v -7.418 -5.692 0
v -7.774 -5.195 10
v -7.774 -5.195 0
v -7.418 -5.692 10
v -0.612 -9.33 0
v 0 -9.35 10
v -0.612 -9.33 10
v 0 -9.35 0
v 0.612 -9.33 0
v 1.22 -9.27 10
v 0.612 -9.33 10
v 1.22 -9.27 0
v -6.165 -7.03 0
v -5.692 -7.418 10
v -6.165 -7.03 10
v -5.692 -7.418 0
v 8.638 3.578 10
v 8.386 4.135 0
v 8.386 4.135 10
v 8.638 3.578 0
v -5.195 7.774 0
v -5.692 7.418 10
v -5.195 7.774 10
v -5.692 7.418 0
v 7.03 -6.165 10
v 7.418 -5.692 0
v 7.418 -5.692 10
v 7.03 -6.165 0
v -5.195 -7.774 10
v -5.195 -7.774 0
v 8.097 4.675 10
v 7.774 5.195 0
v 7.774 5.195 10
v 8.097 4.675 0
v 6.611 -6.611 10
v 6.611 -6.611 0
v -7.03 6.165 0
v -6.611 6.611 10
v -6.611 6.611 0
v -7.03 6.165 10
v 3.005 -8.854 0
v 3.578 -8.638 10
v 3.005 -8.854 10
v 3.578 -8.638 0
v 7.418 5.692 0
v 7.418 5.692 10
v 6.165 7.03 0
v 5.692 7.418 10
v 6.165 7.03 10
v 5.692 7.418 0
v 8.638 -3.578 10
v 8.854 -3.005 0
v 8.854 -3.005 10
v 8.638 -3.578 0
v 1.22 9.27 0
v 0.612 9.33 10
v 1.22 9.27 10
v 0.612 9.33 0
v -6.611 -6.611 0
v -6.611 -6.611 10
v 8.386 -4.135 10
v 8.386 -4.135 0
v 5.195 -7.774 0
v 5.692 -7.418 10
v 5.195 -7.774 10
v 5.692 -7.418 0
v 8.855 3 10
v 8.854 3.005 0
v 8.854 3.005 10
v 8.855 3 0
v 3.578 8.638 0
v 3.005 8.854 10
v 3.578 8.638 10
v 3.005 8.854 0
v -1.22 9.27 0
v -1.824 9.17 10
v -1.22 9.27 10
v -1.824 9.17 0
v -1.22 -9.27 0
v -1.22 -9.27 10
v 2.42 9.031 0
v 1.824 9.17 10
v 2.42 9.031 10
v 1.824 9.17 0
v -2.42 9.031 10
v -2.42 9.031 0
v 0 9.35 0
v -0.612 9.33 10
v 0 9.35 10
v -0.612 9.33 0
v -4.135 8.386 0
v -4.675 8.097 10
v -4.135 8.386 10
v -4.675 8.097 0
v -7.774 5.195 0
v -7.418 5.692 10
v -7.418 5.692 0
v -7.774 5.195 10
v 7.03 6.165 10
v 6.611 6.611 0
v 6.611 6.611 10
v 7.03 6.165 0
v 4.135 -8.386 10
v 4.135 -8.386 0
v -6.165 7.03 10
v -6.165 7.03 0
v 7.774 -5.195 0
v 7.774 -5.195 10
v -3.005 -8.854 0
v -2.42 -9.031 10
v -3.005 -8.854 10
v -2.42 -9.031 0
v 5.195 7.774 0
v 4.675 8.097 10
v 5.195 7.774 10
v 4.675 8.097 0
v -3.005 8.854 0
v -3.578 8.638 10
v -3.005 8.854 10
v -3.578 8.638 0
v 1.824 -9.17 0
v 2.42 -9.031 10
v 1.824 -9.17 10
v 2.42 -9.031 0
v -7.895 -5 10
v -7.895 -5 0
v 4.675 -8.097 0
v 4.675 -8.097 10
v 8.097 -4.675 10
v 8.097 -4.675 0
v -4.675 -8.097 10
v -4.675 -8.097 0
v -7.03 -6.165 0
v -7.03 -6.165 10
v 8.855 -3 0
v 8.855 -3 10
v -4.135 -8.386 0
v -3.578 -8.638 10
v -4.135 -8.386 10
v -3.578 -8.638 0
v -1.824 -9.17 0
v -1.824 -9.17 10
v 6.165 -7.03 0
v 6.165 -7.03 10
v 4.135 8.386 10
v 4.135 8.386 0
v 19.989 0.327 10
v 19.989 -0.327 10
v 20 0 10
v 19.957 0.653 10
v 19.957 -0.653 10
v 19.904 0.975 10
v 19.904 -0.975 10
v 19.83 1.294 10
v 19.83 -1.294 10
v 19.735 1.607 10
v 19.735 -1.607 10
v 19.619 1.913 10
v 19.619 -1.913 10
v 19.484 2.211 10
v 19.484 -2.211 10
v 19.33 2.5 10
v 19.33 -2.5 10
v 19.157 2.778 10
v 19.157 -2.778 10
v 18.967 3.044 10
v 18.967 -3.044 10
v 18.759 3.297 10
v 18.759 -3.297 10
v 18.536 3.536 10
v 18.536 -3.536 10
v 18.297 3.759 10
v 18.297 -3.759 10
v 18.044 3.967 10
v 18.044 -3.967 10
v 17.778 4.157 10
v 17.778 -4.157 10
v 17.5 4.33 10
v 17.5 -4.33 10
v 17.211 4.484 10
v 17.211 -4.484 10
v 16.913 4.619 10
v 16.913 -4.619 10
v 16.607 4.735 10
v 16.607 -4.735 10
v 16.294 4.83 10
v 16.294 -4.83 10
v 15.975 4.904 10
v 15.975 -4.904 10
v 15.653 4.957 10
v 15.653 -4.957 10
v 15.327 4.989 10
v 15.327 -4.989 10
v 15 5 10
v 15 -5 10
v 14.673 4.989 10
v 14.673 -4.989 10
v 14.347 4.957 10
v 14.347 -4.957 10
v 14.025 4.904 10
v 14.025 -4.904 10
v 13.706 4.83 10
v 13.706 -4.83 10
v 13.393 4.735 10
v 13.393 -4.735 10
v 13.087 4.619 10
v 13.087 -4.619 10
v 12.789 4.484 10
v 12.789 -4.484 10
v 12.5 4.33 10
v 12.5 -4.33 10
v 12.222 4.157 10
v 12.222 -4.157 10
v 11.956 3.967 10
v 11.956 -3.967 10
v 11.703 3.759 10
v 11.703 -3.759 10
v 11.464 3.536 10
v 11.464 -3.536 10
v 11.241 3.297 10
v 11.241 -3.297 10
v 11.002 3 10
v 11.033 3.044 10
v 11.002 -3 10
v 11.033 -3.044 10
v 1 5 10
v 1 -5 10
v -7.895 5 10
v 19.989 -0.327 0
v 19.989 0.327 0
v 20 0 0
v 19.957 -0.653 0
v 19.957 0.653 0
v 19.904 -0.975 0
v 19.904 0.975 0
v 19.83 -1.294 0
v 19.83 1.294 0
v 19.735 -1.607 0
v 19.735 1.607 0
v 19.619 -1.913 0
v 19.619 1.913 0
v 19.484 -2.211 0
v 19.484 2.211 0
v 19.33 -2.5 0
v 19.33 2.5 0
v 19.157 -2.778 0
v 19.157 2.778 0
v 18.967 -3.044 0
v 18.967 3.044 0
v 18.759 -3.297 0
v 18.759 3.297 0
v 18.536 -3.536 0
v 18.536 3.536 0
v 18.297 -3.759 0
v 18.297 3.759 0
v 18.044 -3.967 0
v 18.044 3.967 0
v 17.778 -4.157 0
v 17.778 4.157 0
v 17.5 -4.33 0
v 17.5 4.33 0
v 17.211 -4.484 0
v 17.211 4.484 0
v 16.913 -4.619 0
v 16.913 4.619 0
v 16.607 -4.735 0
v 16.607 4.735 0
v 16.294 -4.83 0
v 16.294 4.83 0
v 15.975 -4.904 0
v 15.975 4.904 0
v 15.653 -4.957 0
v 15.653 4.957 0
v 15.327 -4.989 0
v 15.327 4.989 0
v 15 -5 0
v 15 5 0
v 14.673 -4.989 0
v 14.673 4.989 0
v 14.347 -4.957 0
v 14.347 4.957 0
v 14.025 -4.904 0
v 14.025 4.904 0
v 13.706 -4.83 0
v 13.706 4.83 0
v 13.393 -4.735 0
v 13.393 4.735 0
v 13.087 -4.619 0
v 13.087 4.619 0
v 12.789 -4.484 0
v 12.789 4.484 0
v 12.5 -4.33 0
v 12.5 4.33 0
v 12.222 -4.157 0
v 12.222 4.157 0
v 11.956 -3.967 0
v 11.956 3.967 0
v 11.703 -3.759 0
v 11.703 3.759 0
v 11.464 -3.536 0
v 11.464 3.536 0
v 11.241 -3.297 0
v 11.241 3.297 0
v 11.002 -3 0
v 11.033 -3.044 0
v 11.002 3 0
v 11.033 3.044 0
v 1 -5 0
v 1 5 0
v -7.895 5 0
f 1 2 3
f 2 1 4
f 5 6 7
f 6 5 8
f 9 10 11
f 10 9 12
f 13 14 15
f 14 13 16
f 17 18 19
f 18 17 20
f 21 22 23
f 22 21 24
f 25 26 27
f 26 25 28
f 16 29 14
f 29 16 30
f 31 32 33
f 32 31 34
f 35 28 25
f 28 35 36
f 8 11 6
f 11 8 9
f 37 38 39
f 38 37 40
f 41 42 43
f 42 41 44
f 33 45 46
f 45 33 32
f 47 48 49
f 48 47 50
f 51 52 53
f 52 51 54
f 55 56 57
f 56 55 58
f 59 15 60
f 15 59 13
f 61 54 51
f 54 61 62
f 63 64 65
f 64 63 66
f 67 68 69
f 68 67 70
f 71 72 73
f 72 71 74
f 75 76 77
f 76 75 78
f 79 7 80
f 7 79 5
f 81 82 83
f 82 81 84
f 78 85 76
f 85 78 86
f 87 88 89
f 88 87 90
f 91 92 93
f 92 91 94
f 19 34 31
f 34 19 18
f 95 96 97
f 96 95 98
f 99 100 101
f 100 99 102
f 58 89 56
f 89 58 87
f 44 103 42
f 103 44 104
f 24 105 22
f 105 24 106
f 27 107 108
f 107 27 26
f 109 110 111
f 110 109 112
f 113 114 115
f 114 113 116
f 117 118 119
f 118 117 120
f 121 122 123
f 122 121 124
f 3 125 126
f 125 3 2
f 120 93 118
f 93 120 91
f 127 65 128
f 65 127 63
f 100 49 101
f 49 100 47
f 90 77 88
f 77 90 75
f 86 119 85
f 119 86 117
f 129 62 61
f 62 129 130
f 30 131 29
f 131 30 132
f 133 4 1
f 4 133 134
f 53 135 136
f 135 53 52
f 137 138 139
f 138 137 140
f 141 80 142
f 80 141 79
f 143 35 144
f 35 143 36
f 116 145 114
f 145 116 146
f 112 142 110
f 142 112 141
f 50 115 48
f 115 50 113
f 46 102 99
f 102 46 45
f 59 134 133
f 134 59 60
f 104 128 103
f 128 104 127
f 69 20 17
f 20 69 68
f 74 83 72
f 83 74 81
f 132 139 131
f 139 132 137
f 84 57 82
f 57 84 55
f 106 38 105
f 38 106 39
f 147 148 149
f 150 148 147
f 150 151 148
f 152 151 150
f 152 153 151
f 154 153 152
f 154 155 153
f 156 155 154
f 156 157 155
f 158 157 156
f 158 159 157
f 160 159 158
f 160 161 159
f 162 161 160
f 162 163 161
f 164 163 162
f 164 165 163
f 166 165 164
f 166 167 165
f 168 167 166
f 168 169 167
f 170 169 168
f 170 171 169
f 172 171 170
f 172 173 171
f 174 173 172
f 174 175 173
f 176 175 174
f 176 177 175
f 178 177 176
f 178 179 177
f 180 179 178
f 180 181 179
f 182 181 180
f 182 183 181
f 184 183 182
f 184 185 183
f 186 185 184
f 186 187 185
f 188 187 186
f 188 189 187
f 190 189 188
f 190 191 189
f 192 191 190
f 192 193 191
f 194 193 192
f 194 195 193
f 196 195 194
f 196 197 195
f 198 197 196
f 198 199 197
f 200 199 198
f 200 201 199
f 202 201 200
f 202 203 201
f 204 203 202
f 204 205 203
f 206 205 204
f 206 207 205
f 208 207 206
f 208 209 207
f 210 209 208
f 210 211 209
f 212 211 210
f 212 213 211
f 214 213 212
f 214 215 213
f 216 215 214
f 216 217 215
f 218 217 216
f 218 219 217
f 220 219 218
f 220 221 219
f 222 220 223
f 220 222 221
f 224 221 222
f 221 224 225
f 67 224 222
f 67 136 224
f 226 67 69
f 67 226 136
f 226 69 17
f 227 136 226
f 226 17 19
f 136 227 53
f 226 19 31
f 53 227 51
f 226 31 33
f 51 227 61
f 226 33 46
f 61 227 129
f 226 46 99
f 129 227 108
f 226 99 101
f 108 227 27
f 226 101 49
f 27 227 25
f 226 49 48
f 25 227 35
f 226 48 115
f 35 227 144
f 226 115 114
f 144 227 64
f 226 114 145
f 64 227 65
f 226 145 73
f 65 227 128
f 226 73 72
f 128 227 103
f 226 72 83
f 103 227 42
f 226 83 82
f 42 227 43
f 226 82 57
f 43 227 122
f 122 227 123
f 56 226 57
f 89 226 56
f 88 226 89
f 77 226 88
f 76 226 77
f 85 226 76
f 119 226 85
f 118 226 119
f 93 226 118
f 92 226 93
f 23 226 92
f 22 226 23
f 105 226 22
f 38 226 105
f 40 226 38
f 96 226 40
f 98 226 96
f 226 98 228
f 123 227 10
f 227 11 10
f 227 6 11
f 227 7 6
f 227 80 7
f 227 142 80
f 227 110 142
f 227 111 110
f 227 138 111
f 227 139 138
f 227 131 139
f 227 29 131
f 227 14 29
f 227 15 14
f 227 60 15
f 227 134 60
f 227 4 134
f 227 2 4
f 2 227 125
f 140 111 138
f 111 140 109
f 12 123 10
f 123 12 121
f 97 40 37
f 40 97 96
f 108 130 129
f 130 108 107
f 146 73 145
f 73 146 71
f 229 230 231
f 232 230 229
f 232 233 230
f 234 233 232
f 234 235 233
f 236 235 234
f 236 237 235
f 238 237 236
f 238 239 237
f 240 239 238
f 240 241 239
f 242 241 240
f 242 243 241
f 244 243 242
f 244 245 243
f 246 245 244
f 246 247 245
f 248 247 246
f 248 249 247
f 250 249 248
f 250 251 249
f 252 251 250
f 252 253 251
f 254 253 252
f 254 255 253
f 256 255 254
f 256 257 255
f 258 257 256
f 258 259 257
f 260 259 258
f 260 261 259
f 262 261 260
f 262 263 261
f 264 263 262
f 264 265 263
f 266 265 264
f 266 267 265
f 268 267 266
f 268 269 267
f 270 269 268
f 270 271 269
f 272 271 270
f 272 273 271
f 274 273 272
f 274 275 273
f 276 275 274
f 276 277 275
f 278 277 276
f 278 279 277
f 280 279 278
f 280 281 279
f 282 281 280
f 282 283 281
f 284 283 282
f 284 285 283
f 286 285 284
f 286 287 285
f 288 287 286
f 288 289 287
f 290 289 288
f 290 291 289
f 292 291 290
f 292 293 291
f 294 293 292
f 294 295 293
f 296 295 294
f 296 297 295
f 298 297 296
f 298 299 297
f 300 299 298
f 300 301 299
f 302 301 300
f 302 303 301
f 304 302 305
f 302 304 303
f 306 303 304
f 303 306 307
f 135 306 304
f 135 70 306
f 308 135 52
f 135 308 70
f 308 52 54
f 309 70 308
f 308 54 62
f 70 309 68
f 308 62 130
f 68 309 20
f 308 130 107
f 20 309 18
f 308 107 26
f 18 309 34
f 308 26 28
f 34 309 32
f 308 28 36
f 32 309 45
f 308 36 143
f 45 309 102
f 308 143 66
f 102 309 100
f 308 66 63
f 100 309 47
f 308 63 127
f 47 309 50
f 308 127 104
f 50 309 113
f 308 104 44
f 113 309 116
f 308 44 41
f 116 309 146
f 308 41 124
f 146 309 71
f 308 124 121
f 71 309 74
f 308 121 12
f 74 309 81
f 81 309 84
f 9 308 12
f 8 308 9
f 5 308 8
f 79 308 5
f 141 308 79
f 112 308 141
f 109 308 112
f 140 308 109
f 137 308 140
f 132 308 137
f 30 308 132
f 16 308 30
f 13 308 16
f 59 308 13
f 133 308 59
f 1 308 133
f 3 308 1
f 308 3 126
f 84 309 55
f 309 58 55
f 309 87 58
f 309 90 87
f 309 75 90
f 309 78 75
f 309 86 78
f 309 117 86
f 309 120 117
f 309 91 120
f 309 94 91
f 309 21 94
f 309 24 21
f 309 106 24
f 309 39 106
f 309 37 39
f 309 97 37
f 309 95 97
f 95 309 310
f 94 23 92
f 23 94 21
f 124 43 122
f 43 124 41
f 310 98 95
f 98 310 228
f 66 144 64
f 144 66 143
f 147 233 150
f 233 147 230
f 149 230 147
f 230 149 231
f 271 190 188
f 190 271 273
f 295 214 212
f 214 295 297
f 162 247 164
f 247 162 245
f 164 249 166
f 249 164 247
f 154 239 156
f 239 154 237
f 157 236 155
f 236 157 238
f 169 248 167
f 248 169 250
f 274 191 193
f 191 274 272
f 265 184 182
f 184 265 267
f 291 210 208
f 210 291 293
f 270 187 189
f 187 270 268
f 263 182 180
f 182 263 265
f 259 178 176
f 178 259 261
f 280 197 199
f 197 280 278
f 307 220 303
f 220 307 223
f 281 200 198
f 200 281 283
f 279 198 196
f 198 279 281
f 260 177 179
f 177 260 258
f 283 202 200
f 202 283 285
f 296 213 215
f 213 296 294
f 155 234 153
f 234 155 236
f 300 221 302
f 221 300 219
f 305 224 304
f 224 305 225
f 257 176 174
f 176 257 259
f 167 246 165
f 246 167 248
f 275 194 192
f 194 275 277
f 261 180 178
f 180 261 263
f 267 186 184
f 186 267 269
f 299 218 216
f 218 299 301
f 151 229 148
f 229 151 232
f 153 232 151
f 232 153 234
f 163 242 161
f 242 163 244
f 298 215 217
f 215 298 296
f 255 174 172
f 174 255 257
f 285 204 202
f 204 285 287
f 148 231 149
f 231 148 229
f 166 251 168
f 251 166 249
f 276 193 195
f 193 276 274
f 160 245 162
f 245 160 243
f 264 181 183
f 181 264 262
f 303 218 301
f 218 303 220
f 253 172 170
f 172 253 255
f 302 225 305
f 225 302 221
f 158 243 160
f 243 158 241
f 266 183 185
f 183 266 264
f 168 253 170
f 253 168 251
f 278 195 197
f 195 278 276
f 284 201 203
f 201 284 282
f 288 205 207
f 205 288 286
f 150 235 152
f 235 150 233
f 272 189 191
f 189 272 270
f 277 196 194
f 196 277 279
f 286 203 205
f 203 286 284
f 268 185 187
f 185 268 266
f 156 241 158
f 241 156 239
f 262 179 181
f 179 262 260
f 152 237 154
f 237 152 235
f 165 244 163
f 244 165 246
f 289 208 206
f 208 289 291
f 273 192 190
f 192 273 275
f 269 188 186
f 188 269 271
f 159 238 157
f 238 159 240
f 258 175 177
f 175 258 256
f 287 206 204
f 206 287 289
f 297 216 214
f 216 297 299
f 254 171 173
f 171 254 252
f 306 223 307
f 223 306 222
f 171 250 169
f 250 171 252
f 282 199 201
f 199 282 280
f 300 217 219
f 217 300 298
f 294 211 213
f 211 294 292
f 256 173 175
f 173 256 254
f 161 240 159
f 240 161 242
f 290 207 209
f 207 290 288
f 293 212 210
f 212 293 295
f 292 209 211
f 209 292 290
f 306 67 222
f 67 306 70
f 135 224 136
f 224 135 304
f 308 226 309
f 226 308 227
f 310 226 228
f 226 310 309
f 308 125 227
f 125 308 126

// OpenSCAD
// Tubing and stand rod snap-on clip
// Print orientation: flat on bed, z = 0 up to z = 10

// ---------- Parameters ----------
stand_d      = 12.7;   // stand rod diameter
stand_wall   = 3;      // stand ring wall thickness
stand_open   = 10;     // stand ring opening width (y)
stand_r      = stand_d/2 + stand_wall; // stand ring outer radius (18.7)

tubing_d     = 6;      // tubing inner diameter
tubing_wall  = 2;      // tubing ring wall thickness
tubing_x     = 15;     // tubing ring centre x
tubing_r     = tubing_d/2 + tubing_wall; // tubing ring outer radius (10)
tubing_open  = 4.5;    // tubing ring opening width (y)

bridge_w     = 6;      // bridge width (Y)
bridge_x0    = 8;      // bridge start (X)
bridge_x1    = 12;     // bridge end (X)

eps          = 0.5;    // cutter overshoot
$fn          = 96;     // curve resolution

// ---------- Model ----------
difference() {
    union() {
        // Stand ring
        cylinder(r = stand_r, h = 10);
        // Tubing ring
        translate([tubing_x, 0, 0])
            cylinder(r = tubing_r, h = 10);
        // Bridge
        translate([bridge_x0, -bridge_w/2, 0])
            cube([bridge_x1 - bridge_x0, bridge_w, 10]);
    }

    // Stand ring opening: x < 0 and -5 < y < 5
    translate([-stand_r - eps, -stand_open/2, -eps])
        cube([stand_r + eps + 1, stand_open, 10 + 2*eps]);

    // Tubing ring opening: x > 15 and -2.25 < y < 2.25
    translate([tubing_x + tubing_r + eps, -tubing_open/2, -eps])
        cube([tubing_r + eps + 1 - tubing_x, tubing_open, 10 + 2*eps]);
}
